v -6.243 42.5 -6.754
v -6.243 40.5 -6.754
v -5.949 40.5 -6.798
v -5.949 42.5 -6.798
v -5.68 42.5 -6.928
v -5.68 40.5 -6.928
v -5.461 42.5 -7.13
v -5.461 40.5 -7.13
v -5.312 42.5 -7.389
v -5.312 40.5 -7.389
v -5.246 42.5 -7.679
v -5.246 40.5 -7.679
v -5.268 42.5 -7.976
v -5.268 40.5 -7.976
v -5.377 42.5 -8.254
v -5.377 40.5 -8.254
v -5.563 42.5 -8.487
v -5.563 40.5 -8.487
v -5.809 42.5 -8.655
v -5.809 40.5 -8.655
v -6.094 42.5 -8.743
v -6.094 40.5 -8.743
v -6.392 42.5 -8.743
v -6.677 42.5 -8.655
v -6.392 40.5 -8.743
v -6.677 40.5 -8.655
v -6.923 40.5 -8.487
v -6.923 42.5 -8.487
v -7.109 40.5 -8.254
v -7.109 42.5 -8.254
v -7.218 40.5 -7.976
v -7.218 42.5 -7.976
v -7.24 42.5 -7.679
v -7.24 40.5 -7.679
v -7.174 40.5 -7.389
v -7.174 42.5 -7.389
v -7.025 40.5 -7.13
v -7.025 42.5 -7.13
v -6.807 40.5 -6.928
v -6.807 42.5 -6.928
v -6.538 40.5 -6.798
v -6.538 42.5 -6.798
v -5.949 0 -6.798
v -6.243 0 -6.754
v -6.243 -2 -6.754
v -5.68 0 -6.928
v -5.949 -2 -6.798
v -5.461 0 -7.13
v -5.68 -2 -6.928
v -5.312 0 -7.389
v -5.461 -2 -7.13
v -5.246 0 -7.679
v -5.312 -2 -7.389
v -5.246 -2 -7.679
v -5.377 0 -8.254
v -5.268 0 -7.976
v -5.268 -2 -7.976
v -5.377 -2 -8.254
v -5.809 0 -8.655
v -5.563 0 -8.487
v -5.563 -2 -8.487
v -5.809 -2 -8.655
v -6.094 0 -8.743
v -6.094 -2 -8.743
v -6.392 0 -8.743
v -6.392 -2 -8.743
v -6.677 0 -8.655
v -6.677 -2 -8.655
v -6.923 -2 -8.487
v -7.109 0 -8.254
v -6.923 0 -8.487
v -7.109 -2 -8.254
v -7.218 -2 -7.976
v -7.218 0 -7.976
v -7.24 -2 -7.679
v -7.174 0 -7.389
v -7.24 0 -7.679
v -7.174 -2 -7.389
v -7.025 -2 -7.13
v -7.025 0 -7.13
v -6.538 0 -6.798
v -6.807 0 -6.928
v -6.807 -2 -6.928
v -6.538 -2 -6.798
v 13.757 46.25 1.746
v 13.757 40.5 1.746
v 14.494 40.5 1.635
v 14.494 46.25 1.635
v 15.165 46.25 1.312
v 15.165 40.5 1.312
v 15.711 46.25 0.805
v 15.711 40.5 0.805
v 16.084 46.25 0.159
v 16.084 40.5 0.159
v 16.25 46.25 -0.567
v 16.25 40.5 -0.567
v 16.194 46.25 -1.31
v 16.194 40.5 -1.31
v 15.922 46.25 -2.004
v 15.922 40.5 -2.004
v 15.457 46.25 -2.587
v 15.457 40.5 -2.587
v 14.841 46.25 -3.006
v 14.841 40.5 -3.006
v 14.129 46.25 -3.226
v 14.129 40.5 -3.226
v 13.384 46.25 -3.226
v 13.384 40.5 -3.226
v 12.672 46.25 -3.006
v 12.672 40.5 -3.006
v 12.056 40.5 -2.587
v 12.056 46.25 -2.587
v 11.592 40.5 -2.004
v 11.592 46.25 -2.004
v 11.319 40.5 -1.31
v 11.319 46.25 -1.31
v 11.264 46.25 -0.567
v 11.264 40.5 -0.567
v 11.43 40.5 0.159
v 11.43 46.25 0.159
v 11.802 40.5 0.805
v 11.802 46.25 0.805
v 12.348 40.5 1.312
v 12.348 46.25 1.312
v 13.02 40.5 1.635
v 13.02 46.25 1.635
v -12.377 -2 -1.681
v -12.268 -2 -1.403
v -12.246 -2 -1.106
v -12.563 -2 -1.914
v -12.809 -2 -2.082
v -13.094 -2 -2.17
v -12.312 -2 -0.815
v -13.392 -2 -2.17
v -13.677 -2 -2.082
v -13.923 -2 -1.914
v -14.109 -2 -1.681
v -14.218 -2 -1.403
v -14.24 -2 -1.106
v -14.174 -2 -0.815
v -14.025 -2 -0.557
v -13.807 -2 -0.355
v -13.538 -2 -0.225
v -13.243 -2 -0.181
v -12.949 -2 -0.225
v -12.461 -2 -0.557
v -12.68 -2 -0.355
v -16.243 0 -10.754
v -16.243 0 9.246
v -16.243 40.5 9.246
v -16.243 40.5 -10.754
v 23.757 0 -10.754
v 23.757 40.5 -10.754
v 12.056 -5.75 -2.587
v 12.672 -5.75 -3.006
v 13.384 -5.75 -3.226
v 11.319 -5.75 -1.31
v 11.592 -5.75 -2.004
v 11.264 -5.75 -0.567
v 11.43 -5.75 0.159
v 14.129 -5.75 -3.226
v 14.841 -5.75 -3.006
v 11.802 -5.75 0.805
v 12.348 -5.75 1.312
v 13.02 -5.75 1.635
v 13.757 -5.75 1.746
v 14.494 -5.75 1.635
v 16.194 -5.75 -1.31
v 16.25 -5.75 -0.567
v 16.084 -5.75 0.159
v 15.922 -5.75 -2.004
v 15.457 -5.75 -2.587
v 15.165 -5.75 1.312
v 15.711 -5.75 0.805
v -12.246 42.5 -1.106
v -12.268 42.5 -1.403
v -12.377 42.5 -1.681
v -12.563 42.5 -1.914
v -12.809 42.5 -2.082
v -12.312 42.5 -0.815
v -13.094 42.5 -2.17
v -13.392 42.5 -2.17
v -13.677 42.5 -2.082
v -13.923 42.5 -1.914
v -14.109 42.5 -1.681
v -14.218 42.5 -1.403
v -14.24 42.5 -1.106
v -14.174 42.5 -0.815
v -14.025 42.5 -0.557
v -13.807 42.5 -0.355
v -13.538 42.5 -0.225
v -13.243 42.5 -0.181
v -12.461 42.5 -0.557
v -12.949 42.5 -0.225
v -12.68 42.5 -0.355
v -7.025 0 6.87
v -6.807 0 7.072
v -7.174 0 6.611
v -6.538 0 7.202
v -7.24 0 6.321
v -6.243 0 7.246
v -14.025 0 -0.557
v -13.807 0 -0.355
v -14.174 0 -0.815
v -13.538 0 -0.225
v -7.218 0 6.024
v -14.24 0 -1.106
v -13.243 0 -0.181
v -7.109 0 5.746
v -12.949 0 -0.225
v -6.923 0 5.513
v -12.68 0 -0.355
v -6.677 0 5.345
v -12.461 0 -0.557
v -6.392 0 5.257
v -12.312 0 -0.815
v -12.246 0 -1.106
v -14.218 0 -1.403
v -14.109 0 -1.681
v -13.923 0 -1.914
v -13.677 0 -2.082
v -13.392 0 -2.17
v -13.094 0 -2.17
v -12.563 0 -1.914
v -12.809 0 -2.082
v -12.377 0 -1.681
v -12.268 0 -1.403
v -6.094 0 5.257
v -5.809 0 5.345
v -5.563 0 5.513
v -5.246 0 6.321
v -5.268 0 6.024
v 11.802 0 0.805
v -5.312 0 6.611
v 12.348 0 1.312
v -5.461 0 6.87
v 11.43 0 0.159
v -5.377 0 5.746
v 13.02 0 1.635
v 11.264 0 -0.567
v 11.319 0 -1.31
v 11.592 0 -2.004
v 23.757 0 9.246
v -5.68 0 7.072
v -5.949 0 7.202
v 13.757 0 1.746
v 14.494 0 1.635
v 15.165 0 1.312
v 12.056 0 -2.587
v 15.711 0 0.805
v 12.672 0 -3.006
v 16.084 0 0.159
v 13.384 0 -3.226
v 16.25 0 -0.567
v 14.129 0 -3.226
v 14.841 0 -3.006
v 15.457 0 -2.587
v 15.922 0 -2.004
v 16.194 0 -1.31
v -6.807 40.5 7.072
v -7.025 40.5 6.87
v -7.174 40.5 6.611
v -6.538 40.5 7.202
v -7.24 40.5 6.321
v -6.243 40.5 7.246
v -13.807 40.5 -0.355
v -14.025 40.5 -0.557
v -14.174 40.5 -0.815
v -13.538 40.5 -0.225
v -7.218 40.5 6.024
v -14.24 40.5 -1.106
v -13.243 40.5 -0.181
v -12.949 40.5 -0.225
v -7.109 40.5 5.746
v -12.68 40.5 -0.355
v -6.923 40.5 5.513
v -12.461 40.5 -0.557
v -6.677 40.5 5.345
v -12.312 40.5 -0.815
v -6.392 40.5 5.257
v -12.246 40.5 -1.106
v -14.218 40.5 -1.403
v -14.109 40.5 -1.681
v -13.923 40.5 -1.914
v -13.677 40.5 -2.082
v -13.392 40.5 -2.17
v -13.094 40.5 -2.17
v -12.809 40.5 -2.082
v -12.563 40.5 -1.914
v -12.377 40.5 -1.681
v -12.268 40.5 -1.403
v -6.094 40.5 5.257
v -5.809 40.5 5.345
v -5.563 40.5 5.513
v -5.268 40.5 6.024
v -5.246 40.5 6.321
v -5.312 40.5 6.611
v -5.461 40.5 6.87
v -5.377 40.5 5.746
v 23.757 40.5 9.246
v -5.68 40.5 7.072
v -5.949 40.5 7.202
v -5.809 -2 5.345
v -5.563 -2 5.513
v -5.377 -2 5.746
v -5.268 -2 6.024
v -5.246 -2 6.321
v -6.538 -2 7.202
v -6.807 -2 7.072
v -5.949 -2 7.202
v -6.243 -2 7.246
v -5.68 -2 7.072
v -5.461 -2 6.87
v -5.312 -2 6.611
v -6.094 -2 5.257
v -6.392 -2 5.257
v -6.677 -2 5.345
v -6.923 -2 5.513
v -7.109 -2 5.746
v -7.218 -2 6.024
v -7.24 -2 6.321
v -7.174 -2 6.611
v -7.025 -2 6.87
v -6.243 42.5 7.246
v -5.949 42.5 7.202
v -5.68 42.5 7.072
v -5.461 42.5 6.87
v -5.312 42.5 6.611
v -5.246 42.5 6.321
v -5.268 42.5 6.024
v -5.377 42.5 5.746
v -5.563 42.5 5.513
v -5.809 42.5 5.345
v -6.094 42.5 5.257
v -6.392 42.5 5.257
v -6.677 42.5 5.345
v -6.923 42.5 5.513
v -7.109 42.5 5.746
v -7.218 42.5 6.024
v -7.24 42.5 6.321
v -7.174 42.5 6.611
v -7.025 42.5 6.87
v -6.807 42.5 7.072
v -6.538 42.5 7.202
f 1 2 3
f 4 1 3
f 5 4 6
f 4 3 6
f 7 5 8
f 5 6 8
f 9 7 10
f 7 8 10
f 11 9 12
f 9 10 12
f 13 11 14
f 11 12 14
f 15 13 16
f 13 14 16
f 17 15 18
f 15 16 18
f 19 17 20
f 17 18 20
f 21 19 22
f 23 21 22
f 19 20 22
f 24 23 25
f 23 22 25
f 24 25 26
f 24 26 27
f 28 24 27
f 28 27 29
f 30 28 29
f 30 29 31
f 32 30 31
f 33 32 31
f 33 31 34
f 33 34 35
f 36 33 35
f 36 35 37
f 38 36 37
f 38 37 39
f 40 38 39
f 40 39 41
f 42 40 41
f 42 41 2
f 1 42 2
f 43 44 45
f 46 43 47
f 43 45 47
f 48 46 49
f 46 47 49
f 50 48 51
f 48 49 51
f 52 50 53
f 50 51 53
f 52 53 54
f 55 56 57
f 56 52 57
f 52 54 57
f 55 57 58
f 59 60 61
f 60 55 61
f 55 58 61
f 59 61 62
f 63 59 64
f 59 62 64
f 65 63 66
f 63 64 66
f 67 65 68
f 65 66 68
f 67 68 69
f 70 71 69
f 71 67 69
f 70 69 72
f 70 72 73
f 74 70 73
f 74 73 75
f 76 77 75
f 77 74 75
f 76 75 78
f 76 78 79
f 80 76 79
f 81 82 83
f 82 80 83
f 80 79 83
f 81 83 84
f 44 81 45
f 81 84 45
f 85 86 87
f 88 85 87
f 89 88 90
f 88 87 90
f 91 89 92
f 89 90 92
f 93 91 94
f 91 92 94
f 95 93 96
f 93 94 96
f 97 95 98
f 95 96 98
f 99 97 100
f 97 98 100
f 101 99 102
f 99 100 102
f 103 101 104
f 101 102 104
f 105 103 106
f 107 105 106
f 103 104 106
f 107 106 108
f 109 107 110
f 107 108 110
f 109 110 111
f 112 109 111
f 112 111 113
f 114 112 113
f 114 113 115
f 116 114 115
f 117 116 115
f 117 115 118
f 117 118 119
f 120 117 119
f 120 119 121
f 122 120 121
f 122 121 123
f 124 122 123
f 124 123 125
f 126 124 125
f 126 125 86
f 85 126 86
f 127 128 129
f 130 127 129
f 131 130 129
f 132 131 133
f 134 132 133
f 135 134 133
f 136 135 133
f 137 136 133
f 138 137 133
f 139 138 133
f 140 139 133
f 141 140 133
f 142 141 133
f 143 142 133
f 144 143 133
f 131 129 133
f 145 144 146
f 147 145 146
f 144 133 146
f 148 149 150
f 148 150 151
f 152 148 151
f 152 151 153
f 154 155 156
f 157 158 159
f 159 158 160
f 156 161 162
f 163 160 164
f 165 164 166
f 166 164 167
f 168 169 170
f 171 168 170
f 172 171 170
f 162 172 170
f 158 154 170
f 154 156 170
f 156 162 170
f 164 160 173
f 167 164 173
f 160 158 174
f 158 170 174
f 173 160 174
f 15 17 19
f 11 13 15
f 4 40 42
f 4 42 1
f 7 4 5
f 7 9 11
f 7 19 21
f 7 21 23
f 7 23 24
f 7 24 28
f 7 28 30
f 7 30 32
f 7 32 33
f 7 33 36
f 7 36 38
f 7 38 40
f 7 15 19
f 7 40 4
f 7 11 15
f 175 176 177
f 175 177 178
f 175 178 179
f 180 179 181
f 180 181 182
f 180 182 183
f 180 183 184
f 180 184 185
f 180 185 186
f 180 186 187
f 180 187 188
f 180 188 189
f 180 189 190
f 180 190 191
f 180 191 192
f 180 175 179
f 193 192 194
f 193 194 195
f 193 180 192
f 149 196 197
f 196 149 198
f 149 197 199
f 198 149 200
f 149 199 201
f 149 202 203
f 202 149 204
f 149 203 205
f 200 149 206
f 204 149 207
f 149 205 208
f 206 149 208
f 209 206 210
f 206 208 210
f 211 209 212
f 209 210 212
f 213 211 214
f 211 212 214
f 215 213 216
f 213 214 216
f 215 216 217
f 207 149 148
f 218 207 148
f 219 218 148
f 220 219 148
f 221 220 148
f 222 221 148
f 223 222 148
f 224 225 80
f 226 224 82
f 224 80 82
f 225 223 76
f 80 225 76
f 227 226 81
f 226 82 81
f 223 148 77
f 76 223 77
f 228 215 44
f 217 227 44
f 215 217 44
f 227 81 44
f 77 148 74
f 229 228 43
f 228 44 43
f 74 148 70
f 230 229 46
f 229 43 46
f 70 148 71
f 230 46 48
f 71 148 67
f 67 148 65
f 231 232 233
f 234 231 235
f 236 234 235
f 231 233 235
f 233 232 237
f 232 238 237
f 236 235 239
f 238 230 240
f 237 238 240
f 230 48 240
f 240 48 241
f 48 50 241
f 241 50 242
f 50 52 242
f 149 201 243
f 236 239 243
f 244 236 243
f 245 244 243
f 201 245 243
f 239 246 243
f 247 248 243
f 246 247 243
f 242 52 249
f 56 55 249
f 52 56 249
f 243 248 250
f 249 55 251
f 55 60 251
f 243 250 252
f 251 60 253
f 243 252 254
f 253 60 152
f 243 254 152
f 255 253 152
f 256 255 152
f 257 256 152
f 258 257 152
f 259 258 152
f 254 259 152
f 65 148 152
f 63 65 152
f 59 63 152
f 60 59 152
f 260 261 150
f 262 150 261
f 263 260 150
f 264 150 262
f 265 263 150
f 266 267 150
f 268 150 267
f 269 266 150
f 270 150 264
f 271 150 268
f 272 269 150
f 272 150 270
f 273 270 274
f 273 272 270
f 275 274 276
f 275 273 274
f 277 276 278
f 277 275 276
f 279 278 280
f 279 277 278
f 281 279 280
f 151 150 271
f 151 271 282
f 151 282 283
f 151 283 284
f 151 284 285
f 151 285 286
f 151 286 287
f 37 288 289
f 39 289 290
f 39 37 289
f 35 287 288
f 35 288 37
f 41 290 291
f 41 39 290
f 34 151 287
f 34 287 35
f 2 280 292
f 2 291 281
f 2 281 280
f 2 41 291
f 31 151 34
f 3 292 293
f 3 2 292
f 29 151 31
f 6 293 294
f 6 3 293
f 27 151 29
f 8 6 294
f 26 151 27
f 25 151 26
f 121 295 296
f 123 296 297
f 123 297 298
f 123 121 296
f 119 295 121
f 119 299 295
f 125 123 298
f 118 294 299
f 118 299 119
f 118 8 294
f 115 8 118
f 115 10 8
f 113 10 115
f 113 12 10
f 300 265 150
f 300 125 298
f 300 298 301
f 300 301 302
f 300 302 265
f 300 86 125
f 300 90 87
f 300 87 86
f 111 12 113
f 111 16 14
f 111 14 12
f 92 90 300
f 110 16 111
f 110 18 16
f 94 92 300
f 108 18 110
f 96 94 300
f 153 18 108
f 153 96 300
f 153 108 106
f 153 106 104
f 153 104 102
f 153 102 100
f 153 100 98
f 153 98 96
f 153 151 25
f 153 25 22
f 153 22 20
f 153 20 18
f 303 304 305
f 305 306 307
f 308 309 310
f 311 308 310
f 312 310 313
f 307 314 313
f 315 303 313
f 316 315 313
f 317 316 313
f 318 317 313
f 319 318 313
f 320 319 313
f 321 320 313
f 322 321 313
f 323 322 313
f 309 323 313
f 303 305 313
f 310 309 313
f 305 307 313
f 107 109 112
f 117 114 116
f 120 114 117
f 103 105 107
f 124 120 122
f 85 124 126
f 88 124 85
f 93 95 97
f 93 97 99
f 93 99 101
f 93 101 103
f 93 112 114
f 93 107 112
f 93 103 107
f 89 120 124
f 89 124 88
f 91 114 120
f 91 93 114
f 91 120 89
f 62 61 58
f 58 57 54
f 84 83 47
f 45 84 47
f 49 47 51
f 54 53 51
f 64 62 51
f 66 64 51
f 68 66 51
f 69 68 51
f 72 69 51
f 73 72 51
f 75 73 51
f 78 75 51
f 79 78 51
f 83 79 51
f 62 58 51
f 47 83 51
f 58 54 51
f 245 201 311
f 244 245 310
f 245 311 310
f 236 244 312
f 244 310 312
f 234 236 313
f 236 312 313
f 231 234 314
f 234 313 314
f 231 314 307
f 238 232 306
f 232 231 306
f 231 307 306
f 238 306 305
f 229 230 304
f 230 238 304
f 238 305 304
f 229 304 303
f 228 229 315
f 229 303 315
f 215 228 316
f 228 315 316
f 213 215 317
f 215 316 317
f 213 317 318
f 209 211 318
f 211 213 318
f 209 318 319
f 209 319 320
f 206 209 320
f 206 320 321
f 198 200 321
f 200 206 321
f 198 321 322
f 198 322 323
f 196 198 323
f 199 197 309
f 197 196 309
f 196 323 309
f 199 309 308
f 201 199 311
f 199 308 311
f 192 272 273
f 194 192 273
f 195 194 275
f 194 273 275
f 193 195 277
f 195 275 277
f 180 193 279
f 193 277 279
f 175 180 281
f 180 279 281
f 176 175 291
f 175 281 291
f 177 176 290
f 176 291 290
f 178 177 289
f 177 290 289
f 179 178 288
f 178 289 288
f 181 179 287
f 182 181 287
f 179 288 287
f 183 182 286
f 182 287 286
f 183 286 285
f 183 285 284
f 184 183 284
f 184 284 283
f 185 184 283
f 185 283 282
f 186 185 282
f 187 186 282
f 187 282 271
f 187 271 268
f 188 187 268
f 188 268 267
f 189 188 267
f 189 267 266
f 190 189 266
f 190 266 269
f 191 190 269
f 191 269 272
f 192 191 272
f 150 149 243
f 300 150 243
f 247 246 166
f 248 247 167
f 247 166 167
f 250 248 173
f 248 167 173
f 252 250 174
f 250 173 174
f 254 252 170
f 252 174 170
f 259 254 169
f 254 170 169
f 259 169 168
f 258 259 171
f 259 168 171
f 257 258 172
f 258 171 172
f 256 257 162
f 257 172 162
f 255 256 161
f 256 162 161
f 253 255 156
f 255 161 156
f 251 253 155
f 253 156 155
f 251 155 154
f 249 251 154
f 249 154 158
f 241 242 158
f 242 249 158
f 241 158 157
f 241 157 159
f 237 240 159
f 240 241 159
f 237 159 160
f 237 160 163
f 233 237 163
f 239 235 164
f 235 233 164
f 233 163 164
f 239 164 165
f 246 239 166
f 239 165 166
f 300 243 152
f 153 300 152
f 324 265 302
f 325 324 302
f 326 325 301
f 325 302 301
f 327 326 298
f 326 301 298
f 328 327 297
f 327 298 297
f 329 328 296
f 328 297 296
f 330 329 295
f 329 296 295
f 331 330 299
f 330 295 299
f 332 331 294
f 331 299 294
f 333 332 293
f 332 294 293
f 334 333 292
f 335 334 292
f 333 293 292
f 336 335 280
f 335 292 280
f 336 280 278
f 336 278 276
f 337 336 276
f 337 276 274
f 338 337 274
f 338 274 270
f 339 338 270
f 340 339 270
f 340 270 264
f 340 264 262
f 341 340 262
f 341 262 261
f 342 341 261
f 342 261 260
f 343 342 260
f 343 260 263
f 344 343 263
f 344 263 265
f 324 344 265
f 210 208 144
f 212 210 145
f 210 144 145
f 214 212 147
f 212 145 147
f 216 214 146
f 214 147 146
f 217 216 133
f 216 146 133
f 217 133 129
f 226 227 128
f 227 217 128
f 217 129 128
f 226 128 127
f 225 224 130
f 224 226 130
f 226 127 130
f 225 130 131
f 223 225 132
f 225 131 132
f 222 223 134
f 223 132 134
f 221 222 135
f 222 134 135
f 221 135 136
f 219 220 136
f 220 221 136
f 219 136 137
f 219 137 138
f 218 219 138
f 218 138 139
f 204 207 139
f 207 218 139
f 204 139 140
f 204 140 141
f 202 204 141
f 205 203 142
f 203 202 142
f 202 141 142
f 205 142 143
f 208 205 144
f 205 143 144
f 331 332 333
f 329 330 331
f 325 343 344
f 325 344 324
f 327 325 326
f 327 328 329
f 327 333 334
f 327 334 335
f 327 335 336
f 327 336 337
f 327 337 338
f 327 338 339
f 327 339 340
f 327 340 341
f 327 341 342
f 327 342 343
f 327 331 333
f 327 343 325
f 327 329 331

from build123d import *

# Parameters (mm, degrees)
SKETCH1_W                = 40
SKETCH1_H                = 20
BOSS_EXTRUDE1_DEPTH      = 40.5
BOSS_EXTRUDE2_DEPTH      = 5.75
BOSS_EXTRUDE2_DEPTH_BACK = 46.25
SKETCH2_R                = 2.5
BOSS_EXTRUDE3_DEPTH      = 2
BOSS_EXTRUDE3_DEPTH_BACK = 42.5
SKETCH3_R                = 1


with BuildPart() as part:
    # Sketch1 → Boss-Extrude1 (new body)
    with BuildSketch(Plane(origin=(0, 0, 0), x_dir=(1, 0, 0), z_dir=(0, 1, 0))):
        with Locations((3.756737992, 0.753901676)):
            Rectangle(SKETCH1_W, SKETCH1_H)
    extrude(amount=BOSS_EXTRUDE1_DEPTH)

    # Sketch2 → Boss-Extrude2 (add, two sides: drawn at the far end of the back side and taken through both)
    with BuildSketch(Plane(origin=(0, 40.5, 0), x_dir=(1, 0, 0), z_dir=(0, 1, 0)).offset(-BOSS_EXTRUDE2_DEPTH_BACK)):
        with Locations(Location((13.756737992, 0.753901676, 0), (0, 0, 270))):
            Circle(SKETCH2_R)
    extrude(amount=BOSS_EXTRUDE2_DEPTH + BOSS_EXTRUDE2_DEPTH_BACK)

    # Sketch3 → Boss-Extrude3 (add, two sides: drawn at the far end of the back side and taken through both)
    with BuildSketch(Plane(origin=(0, 40.5, 0), x_dir=(1, 0, 0), z_dir=(0, 1, 0)).offset(-BOSS_EXTRUDE3_DEPTH_BACK)):
        with Locations(Location((-13.243262008, 1.180776093, 0), (0, 0, 270))):
            Circle(SKETCH3_R)
        with Locations(Location((-6.243262008, 7.753901676, 0), (0, 0, 270))):
            Circle(SKETCH3_R)
        with Locations(Location((-6.243262008, -6.246098324, 0), (0, 0, 270))):
            Circle(SKETCH3_R)
    extrude(amount=BOSS_EXTRUDE3_DEPTH + BOSS_EXTRUDE3_DEPTH_BACK)


solid = part.part
